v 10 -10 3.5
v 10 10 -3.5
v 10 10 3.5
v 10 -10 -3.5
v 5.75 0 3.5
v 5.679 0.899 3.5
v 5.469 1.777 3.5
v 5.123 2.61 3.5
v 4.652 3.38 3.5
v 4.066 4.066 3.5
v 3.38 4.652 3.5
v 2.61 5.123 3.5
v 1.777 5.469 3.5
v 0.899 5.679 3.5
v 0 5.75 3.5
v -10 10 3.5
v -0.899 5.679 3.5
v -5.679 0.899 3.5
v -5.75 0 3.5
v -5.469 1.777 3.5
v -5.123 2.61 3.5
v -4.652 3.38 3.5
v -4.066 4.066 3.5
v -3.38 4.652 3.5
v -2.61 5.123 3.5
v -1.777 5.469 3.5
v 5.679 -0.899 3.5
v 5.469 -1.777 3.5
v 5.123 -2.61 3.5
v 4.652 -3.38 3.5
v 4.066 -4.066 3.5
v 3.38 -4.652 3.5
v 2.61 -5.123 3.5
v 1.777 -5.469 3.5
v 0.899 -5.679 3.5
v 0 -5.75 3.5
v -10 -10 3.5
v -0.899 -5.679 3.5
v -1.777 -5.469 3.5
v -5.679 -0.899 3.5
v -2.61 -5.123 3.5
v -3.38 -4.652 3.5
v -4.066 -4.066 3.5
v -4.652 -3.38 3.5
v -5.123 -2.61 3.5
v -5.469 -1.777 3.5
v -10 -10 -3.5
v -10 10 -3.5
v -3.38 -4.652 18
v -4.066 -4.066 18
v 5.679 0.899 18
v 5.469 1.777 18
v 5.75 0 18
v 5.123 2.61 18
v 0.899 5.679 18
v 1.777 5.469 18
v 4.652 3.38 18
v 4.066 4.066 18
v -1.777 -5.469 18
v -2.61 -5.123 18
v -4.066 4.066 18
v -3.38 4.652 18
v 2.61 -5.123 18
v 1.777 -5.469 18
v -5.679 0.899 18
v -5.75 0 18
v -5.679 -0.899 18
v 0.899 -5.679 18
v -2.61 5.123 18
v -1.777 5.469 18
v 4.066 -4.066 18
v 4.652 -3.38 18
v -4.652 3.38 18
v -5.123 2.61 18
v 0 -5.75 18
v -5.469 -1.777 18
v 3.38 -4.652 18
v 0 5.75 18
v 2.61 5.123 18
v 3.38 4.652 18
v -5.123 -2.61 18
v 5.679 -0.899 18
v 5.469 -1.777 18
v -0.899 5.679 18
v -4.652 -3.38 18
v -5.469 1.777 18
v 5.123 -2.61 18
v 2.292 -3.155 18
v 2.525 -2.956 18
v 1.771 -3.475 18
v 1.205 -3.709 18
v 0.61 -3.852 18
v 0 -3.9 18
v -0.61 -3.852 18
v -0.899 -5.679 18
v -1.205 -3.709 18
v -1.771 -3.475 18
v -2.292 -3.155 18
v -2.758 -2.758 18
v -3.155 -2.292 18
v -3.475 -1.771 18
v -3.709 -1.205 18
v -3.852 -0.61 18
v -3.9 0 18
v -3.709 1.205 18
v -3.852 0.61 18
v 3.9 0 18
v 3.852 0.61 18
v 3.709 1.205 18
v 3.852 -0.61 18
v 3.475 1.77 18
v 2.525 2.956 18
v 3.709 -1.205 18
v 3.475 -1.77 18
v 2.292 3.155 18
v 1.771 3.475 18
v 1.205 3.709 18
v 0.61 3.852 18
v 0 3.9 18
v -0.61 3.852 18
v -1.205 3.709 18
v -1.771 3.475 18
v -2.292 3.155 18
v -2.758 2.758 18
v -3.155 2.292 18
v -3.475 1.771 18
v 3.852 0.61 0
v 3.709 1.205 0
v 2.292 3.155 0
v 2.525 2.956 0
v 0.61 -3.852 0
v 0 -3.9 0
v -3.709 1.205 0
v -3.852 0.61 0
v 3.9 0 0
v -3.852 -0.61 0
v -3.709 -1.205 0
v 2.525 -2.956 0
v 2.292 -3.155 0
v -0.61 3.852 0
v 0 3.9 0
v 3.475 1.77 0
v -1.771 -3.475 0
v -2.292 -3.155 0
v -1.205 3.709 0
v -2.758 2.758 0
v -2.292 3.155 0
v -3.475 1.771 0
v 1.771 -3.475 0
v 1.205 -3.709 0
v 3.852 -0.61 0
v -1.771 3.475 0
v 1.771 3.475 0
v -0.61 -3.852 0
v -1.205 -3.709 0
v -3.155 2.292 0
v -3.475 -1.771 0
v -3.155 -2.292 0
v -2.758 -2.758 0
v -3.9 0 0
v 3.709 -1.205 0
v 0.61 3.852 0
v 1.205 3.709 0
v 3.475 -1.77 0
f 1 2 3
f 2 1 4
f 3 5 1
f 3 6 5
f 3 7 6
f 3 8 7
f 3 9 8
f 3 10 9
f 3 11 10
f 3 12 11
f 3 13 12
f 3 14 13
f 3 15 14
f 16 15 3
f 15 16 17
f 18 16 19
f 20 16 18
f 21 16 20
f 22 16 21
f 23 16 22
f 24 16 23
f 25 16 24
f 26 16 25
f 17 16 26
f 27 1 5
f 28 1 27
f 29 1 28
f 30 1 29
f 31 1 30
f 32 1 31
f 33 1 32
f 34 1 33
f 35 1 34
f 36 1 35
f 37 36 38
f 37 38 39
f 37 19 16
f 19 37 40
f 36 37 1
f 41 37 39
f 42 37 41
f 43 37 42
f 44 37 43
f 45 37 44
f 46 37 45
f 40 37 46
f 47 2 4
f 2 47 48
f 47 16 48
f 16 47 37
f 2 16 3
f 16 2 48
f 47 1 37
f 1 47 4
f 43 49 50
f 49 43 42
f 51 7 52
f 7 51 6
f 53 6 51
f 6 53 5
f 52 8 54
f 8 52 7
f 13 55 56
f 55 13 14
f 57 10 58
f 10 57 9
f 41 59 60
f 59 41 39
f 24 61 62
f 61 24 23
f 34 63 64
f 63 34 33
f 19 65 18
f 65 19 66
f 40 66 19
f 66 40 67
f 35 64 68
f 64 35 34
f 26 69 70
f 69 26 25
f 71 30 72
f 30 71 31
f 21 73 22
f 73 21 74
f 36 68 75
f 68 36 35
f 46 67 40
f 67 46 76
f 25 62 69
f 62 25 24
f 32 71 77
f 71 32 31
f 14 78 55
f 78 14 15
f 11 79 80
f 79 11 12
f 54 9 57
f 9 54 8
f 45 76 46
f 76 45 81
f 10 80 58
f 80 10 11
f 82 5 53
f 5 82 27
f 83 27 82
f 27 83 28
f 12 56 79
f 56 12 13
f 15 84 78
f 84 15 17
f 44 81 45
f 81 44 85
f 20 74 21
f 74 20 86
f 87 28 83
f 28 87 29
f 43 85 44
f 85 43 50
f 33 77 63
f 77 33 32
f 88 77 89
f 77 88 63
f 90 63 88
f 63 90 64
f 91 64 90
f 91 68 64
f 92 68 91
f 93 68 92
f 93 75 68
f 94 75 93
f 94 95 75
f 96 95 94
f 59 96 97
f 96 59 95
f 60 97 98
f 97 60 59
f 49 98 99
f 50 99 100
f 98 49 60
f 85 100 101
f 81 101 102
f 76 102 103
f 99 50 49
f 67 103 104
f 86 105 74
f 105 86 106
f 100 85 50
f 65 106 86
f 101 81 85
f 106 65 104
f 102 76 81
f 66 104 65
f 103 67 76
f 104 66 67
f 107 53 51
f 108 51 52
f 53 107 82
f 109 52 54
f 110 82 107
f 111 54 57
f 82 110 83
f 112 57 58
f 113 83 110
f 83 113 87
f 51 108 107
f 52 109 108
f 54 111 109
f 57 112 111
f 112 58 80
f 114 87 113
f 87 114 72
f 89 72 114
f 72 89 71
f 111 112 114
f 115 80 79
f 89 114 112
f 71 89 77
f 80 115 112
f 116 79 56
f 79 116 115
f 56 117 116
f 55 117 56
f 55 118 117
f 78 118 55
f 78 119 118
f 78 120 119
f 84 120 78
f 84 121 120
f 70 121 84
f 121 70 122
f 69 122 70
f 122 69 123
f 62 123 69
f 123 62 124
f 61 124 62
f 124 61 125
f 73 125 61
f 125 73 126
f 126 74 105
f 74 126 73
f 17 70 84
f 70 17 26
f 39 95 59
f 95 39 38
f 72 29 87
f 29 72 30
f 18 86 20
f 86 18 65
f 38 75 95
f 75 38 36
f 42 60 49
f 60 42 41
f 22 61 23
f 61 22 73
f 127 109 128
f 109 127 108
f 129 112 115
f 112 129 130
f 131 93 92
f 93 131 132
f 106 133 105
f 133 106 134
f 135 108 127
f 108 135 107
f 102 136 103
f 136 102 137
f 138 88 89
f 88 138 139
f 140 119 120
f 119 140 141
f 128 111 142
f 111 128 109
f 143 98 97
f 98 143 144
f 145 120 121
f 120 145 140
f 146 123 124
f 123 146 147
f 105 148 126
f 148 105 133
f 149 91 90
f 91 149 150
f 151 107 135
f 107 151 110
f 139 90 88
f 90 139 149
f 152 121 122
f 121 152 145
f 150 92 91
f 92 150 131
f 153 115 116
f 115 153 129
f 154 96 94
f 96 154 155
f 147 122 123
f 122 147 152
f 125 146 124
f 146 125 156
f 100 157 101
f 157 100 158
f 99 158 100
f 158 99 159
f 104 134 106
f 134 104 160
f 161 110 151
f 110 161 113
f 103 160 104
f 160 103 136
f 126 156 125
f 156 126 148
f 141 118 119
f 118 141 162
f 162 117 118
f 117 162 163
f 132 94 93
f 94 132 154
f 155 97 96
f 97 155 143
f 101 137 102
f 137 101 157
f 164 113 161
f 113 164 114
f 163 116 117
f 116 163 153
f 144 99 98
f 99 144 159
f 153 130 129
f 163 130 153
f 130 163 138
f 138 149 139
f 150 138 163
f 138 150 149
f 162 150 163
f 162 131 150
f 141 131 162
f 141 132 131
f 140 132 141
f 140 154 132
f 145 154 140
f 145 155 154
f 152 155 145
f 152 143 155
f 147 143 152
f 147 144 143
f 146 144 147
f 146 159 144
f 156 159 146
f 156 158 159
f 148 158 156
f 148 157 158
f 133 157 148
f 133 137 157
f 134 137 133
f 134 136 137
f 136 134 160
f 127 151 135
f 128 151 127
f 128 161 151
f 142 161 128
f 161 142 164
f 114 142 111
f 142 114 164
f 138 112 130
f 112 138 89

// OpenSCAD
$fn = 40;

difference() {
    union() {
        cube(size = [20, 20, 7], center = true);

        translate([0, 0, 7 + 3.5]) {
            cylinder(r = 11.5 / 2, 15, center = true);
        }
    }

    //cylinder(r = 3.4, h = 100);
    cylinder(r = 3.9, h = 100);
}

translate([3, 0, 9]) {
    cube(size = [0.95, 7, 18], center = true);
}
